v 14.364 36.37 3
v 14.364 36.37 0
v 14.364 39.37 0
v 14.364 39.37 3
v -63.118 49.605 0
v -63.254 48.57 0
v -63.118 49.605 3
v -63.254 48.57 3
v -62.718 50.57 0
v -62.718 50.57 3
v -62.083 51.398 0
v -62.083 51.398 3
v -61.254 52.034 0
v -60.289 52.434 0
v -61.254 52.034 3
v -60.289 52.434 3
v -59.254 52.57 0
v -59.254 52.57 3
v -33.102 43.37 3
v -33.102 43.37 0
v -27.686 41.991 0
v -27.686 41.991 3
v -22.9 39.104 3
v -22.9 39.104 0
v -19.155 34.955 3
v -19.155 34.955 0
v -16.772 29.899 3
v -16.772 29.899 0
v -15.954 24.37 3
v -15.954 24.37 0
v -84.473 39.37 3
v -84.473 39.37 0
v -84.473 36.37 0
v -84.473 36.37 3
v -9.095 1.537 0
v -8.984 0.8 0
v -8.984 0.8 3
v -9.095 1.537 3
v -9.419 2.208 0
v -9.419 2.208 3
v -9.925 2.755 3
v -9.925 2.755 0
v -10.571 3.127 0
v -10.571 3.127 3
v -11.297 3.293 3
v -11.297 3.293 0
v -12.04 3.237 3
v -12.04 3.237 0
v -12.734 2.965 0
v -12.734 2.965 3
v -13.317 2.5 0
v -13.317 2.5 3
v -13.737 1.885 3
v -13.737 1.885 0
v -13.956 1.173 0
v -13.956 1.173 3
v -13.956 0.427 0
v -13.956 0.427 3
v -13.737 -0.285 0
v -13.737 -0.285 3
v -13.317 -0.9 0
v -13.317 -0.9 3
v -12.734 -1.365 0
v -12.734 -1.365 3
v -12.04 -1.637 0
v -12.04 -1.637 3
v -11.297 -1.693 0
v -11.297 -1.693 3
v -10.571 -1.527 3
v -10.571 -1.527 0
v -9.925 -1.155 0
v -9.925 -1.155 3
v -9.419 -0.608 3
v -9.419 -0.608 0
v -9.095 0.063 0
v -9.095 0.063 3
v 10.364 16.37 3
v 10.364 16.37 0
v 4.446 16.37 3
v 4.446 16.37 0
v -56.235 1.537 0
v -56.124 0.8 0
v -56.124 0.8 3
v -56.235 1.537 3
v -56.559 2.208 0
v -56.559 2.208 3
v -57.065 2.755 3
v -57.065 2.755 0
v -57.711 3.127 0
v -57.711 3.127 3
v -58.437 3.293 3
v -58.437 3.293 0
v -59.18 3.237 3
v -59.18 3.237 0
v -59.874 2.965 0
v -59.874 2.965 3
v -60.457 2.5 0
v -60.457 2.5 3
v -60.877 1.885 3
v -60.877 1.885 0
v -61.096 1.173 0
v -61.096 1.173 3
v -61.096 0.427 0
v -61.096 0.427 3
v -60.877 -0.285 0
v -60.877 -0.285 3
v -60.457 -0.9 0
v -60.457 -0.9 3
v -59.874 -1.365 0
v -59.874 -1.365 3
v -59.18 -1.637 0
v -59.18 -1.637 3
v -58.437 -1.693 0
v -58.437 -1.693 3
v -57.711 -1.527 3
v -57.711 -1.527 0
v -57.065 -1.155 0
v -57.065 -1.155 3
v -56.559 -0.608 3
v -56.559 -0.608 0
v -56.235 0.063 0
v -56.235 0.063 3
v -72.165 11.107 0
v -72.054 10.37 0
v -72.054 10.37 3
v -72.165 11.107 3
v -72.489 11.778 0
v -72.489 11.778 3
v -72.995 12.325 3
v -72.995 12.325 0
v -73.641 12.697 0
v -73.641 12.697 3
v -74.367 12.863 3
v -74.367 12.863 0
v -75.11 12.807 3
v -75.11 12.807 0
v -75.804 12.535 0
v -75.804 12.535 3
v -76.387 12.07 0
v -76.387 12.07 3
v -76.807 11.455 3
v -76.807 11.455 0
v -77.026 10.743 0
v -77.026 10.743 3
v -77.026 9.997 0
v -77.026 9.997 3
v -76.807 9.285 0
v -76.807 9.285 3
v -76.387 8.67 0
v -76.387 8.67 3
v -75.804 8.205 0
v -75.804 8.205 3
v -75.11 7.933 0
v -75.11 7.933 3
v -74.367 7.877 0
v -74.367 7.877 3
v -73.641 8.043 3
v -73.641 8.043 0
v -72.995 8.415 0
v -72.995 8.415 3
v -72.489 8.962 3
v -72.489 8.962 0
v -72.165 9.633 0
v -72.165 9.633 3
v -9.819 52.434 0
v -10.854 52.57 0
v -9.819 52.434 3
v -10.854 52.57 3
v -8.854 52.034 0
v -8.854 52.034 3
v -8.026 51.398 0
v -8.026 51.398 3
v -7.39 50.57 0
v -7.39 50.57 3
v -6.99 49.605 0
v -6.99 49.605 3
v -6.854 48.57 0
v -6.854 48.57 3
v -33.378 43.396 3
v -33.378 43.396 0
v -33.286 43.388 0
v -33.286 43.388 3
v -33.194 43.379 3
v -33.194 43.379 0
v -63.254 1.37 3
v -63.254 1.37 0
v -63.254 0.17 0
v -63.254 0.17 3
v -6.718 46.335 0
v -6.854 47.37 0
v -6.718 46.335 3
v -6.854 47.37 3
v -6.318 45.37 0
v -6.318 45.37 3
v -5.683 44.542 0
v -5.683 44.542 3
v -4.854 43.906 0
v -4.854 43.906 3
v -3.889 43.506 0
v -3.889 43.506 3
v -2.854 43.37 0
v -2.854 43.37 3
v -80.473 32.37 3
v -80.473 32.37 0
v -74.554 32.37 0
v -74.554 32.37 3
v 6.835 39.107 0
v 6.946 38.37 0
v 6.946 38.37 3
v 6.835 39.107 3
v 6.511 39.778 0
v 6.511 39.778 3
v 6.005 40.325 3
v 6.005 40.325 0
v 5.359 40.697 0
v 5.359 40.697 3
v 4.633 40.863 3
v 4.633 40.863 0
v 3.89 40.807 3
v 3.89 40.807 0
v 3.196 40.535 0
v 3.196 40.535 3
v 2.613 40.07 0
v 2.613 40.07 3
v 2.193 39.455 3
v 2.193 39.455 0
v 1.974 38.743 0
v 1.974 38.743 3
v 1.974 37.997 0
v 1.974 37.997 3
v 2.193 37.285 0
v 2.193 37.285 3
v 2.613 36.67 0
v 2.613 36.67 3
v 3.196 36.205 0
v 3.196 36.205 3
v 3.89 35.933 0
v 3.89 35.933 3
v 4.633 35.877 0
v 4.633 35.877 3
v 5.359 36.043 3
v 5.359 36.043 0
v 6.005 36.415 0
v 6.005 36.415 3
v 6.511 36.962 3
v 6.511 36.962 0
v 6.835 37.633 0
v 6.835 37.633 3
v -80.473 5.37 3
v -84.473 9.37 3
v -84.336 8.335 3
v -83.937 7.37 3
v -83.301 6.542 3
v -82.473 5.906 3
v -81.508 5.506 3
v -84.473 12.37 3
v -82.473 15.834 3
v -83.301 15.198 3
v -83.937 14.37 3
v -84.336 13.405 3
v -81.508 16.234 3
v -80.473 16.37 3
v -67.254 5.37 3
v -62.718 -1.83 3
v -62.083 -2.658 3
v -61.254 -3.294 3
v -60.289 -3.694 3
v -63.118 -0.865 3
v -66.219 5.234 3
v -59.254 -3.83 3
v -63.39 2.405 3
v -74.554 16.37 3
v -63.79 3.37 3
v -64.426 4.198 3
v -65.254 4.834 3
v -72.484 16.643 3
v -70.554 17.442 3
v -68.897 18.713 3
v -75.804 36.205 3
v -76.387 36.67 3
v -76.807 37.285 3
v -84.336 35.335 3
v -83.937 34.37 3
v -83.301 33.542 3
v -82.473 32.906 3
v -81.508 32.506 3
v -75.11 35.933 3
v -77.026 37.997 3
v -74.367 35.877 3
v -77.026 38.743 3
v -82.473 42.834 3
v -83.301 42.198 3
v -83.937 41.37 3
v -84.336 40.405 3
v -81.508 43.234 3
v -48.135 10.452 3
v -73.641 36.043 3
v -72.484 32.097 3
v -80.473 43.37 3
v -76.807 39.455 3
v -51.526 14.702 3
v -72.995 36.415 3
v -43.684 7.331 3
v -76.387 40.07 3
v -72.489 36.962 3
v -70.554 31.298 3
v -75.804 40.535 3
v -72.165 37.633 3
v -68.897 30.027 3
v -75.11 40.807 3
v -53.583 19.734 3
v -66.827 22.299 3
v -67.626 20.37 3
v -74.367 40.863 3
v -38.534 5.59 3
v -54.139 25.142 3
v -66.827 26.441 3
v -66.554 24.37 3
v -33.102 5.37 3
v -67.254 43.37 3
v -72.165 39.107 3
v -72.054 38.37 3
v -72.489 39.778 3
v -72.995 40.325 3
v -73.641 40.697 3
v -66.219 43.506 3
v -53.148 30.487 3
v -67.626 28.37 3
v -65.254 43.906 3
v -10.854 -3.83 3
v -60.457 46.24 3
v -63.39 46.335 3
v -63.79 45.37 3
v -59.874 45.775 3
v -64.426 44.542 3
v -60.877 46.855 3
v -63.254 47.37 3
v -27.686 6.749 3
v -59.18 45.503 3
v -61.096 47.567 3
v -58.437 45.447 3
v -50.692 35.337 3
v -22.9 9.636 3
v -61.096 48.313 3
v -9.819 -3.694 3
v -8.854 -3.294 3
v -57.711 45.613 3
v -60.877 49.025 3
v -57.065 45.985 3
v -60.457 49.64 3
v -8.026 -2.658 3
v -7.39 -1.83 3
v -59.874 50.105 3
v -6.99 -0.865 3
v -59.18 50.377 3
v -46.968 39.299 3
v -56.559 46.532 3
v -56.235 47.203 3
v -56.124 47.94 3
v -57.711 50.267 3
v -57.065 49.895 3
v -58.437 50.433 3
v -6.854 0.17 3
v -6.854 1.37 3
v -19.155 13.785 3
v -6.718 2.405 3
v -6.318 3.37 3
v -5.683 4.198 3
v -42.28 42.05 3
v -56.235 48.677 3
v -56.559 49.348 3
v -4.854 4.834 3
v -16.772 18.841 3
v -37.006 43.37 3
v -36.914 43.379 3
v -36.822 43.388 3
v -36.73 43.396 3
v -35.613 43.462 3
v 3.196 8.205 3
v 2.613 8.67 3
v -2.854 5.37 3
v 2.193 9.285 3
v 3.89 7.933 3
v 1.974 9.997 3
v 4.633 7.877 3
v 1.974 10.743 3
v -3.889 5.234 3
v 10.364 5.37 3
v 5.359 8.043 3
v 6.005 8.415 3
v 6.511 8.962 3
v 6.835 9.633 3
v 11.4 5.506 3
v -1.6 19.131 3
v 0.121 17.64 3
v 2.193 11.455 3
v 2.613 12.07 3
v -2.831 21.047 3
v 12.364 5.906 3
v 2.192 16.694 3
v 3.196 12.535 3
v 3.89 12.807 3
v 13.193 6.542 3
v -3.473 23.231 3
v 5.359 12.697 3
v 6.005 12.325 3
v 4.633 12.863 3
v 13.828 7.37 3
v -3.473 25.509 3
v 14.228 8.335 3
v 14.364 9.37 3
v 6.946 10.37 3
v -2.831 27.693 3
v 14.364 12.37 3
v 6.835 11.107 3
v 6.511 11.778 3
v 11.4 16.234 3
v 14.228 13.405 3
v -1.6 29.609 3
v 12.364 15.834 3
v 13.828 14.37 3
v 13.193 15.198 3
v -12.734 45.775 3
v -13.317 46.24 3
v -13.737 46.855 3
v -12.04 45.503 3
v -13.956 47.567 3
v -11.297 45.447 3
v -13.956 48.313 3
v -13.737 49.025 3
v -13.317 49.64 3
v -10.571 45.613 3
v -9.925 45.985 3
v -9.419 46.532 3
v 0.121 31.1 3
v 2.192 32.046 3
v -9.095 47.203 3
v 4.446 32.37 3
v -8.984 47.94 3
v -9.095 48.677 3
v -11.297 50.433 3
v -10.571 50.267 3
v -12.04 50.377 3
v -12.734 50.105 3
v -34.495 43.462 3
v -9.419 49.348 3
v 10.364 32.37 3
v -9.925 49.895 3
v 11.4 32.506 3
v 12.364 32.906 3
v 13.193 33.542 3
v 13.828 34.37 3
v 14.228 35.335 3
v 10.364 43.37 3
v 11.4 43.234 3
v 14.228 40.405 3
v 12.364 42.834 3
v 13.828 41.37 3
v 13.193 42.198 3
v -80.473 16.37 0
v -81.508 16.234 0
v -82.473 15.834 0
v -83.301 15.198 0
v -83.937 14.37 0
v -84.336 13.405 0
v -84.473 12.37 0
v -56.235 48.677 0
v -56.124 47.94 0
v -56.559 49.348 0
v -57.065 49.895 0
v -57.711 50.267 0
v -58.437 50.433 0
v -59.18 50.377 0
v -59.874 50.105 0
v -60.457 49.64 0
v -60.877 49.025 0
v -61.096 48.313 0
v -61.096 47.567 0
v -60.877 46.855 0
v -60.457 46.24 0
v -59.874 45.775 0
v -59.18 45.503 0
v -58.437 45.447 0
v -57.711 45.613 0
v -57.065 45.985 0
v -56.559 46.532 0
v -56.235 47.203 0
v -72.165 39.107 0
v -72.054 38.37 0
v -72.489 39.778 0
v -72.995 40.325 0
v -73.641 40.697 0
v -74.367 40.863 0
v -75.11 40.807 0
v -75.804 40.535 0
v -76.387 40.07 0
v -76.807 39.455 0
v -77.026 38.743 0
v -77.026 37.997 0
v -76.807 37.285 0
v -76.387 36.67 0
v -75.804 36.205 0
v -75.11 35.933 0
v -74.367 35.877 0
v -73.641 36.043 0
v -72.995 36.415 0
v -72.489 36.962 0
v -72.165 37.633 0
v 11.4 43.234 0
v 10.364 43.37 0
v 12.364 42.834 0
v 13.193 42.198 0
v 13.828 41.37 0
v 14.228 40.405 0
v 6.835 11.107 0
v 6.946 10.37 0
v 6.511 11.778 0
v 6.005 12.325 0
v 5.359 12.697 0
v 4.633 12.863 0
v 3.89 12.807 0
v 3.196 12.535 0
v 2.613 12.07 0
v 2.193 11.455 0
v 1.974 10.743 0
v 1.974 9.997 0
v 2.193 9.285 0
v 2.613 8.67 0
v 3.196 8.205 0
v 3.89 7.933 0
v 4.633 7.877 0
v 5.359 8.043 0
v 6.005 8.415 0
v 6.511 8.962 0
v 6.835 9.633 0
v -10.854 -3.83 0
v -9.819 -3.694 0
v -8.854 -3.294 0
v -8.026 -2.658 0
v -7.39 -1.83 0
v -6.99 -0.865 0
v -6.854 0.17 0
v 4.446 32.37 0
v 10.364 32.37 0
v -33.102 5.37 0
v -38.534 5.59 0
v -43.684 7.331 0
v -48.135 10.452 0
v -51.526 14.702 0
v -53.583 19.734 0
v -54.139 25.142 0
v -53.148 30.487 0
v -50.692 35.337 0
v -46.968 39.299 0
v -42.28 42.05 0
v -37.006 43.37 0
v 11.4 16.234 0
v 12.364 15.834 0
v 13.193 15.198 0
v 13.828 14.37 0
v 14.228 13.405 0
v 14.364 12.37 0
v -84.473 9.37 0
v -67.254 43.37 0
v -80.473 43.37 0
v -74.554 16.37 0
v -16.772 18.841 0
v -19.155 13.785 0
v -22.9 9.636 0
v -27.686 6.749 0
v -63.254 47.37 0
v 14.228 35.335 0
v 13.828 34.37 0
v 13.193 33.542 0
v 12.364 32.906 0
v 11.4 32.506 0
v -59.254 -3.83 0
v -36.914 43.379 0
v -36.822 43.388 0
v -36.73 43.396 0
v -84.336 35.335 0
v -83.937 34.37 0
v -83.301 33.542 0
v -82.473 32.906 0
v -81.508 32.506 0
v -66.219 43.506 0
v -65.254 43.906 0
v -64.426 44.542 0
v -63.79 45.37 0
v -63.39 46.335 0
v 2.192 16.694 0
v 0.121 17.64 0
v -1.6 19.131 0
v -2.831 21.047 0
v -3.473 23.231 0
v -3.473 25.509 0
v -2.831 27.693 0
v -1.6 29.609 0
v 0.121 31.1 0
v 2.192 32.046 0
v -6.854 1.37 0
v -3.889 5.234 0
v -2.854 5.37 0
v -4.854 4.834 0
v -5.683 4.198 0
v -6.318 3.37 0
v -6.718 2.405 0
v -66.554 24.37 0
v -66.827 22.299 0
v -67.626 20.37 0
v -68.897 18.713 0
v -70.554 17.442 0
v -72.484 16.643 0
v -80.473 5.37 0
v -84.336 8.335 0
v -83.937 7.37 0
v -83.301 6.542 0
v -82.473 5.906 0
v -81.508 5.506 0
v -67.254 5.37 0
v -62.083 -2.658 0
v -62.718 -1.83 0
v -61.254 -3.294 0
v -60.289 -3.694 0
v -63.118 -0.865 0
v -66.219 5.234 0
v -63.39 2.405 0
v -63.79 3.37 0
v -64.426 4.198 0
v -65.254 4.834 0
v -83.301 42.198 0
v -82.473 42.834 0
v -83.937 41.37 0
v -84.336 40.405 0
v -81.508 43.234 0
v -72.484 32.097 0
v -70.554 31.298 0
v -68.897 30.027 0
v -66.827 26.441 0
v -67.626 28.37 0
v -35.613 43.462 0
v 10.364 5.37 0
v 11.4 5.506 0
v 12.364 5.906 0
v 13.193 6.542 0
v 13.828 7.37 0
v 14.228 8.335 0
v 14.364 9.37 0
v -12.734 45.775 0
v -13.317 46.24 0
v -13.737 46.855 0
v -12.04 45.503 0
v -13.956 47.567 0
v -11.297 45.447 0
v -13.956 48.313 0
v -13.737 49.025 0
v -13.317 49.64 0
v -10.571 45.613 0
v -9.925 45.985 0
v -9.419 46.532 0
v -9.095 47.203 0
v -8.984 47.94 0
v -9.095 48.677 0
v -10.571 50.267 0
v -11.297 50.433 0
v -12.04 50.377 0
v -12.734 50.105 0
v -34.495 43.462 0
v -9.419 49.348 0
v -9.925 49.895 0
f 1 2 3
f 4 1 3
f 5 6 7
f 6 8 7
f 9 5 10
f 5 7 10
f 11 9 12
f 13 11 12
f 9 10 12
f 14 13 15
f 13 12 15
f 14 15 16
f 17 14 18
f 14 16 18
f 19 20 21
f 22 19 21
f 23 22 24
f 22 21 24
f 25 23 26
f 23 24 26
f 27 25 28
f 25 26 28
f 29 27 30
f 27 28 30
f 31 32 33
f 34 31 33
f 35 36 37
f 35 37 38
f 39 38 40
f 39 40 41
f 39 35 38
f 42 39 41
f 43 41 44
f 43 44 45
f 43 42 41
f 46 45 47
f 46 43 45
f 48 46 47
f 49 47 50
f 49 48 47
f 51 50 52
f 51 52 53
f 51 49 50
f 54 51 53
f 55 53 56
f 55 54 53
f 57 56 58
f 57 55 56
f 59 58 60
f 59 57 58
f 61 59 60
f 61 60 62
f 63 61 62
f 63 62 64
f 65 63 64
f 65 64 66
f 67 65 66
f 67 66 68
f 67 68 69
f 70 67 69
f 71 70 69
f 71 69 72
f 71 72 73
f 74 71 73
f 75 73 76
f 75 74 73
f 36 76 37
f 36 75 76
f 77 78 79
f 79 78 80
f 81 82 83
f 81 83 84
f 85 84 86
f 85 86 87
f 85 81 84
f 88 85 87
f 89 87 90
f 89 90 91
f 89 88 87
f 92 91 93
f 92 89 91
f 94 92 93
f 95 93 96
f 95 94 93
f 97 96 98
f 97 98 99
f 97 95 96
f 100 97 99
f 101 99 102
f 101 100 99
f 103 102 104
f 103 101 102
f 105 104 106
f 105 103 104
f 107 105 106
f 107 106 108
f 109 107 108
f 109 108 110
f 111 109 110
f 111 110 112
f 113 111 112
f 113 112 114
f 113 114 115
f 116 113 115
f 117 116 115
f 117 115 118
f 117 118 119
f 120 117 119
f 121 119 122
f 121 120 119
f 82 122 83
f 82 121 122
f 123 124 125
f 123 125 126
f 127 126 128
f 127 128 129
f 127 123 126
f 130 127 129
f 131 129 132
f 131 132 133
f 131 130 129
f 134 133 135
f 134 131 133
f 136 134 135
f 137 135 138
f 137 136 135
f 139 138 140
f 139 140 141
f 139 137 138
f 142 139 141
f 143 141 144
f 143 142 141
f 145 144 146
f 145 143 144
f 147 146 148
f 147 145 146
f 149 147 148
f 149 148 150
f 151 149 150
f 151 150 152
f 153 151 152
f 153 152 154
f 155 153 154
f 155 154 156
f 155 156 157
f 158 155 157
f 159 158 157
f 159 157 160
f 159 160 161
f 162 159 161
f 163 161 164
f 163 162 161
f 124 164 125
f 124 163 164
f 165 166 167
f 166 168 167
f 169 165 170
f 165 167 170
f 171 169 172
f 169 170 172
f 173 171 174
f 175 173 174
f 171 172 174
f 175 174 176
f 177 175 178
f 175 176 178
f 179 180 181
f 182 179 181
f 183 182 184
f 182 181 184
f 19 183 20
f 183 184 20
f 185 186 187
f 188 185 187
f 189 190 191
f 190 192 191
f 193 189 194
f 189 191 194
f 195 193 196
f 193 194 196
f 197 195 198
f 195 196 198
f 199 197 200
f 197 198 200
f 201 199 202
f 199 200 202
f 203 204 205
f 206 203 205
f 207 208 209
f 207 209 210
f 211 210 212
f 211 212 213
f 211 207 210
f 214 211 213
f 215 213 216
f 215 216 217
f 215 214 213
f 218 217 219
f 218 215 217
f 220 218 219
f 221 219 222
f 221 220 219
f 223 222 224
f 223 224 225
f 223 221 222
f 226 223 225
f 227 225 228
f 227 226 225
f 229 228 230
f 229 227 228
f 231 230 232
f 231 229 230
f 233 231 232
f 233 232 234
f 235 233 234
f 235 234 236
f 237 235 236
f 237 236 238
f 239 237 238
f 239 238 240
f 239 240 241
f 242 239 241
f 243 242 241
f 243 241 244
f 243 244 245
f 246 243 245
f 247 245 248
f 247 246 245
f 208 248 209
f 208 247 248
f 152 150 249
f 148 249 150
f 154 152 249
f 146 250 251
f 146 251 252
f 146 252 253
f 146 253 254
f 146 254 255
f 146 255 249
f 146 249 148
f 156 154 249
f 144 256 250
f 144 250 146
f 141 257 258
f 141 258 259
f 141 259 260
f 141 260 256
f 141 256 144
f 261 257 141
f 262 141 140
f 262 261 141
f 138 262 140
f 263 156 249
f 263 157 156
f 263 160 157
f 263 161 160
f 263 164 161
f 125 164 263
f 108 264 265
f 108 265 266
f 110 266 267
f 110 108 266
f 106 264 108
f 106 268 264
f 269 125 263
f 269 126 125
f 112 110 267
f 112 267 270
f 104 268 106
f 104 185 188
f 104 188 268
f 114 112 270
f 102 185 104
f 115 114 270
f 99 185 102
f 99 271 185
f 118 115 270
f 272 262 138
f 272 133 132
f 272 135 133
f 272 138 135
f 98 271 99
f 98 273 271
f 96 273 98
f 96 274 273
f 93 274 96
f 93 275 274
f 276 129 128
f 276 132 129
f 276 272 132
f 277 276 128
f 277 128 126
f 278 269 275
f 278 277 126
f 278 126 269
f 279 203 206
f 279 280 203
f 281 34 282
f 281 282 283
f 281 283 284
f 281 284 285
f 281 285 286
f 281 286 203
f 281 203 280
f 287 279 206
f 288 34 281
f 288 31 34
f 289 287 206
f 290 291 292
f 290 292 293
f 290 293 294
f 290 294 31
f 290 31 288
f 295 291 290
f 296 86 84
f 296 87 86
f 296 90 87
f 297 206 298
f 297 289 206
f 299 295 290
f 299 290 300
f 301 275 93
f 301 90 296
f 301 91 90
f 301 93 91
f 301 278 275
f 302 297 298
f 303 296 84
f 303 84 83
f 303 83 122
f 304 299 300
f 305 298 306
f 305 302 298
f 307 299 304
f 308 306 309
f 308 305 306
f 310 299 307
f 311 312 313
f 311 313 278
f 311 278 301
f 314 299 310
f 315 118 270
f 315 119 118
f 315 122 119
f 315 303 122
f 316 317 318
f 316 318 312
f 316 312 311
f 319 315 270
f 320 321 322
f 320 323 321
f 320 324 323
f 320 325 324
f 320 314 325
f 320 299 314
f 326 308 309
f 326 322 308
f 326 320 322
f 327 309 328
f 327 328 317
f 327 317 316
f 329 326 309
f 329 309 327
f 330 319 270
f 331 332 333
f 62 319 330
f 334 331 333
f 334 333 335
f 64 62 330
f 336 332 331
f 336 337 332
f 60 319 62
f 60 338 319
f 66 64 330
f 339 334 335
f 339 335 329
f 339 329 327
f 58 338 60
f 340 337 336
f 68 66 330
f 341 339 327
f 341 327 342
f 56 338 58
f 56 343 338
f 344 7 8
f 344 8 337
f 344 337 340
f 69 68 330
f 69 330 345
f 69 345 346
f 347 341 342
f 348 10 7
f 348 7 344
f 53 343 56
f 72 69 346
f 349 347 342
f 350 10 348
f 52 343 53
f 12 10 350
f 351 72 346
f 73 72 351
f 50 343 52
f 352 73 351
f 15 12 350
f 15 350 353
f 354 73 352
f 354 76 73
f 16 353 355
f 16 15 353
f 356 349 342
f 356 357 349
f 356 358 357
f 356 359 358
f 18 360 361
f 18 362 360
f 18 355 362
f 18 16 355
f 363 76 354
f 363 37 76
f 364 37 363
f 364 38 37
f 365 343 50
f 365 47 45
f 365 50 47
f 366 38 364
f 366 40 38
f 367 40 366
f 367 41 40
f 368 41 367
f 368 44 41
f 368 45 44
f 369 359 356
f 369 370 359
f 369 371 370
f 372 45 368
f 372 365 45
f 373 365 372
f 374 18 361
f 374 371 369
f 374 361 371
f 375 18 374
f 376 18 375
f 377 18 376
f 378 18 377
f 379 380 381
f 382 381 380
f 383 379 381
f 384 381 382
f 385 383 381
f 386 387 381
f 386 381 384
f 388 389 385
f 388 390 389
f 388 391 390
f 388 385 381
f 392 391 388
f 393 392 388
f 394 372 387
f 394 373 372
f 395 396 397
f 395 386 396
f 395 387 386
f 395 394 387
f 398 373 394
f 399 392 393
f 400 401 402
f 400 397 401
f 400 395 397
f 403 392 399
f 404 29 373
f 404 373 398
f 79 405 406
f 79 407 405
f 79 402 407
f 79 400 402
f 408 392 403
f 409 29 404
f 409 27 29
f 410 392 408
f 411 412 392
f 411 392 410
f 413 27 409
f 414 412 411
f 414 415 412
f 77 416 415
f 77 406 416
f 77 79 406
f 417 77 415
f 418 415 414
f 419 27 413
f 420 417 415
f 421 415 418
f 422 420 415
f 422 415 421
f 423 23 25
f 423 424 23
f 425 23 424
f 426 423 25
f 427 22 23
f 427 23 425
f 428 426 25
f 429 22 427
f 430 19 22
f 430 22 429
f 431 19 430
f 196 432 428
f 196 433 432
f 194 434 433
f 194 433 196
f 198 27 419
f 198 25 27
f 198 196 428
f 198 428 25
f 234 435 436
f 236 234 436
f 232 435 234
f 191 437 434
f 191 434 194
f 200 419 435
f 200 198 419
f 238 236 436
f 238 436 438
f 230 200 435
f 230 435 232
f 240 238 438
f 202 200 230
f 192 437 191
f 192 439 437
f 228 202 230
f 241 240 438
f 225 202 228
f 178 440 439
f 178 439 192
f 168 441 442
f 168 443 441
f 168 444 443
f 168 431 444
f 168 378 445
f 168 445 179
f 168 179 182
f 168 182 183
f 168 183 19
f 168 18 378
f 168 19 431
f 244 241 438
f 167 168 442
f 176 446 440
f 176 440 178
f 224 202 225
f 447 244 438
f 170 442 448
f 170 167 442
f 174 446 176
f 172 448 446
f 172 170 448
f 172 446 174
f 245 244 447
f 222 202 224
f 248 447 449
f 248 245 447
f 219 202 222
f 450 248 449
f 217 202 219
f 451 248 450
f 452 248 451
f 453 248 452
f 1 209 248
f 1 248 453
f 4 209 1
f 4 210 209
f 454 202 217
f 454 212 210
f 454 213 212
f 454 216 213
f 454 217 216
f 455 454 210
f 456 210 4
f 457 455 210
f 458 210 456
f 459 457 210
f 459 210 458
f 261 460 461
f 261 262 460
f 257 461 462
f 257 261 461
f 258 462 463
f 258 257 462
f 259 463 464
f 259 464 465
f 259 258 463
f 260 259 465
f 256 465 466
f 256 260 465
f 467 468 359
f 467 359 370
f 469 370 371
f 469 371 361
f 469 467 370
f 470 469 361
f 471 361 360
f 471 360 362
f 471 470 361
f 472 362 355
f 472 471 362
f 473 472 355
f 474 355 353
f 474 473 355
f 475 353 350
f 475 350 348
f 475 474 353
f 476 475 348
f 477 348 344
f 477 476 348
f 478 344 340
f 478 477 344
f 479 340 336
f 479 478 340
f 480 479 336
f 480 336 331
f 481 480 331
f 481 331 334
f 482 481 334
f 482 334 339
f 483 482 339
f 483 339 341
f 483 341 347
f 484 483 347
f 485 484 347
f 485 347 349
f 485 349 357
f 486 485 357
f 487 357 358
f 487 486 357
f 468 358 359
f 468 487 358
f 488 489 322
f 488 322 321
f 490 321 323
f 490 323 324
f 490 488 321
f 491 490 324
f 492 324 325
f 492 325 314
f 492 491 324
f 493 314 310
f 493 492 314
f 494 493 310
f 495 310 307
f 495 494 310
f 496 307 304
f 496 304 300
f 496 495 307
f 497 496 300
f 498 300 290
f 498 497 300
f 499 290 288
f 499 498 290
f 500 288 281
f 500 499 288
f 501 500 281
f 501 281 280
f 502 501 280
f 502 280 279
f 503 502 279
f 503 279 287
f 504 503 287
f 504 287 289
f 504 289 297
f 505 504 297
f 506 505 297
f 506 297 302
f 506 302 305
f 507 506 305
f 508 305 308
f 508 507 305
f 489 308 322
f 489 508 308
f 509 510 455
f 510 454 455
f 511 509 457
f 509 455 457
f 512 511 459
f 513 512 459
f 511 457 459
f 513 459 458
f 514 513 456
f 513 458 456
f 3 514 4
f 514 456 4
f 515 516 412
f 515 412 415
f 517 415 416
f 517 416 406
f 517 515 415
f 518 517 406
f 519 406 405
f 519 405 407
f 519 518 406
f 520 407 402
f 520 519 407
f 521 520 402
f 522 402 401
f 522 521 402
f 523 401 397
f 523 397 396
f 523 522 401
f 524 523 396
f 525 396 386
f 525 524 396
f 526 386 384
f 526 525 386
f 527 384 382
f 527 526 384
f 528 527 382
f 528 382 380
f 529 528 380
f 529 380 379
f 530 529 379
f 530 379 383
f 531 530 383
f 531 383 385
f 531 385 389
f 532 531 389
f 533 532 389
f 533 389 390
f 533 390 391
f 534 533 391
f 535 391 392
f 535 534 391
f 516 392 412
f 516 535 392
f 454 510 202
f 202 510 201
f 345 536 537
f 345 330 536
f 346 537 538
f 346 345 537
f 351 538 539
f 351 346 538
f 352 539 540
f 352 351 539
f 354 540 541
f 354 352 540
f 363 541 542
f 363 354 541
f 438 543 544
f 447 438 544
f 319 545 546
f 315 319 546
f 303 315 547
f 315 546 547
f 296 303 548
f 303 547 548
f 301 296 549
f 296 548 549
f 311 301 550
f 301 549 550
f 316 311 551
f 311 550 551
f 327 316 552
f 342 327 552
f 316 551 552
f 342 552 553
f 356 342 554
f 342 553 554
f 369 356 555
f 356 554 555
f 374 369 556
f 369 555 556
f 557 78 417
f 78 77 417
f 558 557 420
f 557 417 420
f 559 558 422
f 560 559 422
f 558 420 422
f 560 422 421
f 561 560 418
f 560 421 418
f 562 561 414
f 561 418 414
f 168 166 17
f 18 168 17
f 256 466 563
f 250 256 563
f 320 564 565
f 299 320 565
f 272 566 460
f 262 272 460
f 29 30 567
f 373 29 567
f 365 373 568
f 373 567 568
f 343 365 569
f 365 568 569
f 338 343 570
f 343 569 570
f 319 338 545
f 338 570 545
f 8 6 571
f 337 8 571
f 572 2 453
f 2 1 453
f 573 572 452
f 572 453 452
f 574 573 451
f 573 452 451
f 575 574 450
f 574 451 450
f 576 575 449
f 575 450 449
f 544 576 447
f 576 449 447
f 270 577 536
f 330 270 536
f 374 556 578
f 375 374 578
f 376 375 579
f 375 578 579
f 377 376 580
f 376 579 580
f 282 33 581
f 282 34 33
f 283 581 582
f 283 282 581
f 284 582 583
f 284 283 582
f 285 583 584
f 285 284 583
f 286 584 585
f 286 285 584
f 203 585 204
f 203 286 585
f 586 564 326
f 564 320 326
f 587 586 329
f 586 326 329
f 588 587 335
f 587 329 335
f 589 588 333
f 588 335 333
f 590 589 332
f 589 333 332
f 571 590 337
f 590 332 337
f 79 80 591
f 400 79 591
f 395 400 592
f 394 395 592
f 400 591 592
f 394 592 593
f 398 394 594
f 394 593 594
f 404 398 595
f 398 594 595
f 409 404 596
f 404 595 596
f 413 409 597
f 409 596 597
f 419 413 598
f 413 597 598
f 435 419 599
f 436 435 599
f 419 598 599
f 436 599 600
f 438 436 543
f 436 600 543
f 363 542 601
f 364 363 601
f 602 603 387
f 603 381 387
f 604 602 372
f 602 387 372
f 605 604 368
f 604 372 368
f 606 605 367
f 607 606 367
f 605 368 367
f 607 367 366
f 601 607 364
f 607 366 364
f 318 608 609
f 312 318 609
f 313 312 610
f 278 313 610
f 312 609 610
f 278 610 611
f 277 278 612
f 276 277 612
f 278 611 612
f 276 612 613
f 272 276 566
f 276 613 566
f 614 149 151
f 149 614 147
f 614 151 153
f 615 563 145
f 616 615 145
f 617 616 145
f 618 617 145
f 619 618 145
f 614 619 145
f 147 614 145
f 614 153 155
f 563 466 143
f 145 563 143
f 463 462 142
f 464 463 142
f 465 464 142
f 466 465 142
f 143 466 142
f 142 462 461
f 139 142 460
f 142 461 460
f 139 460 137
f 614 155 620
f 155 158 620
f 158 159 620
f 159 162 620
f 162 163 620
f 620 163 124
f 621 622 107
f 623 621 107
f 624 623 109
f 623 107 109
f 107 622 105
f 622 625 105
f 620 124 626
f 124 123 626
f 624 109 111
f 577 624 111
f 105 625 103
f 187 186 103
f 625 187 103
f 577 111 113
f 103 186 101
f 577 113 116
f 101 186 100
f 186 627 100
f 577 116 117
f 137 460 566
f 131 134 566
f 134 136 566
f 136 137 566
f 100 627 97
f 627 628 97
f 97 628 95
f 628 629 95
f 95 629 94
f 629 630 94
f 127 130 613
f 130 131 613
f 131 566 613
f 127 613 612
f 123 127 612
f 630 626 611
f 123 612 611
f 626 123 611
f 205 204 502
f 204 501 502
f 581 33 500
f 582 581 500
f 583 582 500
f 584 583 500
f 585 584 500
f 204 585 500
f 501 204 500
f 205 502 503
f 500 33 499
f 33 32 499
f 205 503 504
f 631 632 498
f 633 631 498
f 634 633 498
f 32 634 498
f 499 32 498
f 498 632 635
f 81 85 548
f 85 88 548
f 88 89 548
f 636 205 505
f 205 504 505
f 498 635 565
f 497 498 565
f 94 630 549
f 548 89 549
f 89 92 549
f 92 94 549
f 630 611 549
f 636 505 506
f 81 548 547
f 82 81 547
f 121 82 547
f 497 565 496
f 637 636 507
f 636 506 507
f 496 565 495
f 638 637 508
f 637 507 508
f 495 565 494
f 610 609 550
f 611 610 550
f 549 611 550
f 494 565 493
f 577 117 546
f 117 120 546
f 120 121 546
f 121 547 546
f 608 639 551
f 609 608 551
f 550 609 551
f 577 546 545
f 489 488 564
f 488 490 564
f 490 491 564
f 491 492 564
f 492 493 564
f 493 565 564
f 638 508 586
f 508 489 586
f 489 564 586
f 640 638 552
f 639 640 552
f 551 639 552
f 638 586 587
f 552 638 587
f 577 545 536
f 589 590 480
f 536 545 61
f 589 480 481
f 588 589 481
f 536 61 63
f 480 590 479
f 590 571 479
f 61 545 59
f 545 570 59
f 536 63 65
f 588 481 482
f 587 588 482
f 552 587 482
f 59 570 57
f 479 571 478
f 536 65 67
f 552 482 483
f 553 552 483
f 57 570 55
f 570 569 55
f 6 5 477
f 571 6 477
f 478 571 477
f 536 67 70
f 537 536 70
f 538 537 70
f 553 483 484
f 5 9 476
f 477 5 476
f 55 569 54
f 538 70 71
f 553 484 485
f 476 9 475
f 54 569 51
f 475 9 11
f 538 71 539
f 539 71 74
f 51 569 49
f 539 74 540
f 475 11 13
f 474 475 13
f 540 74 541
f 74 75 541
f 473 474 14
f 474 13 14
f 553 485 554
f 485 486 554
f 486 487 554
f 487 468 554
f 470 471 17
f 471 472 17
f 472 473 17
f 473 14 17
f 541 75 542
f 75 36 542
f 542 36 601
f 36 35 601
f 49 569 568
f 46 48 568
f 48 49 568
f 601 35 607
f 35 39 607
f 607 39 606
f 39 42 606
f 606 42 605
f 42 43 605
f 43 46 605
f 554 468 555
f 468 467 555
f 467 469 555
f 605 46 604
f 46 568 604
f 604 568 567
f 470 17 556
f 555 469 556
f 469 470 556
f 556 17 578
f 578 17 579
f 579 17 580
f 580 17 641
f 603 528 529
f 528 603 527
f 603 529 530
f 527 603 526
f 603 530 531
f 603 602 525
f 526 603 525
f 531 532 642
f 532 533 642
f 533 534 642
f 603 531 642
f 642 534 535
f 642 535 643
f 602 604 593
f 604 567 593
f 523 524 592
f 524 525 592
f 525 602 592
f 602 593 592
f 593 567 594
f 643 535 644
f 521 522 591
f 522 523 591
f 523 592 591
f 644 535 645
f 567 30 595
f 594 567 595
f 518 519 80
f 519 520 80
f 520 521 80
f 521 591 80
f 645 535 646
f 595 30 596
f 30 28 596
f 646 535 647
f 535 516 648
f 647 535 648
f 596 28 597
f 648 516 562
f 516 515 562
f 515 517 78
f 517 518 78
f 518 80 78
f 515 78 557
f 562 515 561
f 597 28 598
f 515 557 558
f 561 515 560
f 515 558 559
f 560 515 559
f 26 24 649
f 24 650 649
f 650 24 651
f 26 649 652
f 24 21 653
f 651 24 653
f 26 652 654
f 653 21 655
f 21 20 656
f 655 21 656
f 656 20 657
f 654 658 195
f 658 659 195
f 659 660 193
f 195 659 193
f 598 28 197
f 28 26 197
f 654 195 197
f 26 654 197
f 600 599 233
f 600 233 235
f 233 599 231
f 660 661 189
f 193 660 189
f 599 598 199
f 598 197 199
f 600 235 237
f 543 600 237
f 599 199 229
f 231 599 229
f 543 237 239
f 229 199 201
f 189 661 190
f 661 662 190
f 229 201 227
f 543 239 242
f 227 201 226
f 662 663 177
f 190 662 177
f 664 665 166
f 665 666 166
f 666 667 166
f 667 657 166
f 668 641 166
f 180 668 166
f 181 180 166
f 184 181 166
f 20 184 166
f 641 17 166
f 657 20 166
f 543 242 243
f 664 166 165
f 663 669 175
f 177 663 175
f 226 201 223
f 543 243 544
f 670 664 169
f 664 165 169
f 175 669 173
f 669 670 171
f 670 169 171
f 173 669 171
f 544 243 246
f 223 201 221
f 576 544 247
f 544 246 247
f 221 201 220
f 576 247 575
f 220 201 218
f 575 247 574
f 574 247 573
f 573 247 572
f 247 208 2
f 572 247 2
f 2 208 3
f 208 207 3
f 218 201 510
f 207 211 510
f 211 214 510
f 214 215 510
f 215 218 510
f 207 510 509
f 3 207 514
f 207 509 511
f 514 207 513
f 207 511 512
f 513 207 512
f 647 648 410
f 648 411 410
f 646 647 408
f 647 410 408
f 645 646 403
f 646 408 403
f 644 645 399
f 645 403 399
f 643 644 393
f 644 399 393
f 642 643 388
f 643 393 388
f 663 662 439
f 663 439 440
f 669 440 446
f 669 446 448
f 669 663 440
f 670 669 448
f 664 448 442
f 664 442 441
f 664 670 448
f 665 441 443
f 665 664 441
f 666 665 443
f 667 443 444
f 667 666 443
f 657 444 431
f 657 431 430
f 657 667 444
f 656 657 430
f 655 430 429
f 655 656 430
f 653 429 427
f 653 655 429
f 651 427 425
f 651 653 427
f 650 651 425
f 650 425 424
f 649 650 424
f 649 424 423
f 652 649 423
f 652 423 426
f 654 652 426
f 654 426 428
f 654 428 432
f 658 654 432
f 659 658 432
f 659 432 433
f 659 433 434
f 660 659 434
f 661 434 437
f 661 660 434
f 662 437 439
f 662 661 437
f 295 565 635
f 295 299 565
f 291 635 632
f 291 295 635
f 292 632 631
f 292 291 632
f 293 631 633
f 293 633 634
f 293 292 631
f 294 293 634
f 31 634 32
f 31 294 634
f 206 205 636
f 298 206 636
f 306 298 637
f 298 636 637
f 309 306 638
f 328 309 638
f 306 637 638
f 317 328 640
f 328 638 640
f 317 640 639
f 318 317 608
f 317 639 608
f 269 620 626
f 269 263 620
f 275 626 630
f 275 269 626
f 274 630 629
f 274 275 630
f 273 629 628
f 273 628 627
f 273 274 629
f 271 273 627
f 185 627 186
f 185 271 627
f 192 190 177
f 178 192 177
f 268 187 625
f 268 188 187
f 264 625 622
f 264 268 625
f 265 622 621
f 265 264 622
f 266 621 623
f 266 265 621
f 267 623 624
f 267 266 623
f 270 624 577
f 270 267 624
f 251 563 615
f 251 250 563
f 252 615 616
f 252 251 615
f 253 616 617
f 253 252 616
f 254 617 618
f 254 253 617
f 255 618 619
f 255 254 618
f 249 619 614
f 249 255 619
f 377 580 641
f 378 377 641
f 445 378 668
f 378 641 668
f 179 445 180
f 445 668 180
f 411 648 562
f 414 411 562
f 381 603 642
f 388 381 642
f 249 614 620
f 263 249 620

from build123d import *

# Parameters (mm, degrees)
F0_R     = 2.5
F1_DEPTH = 3
F2_R     = 4


with BuildPart() as f1:
    # F0 (on Top) → F1 (new body)
    with BuildSketch(Plane.XY):
        with BuildLine():
            Line((-37.006066629, 43.3700063947), (-63.2541444994, 43.3700063947))
            Line((-63.2541444994, 43.3700063947), (-63.2541444994, 5.3700063947))
            Line((-63.2541444994, 5.3700063947), (-37.006066629, 5.3700063947))
            ThreePointArc((-37.006066629, 5.3700063947), (-54.1541444994, 24.3700063947), (-37.006066629, 43.3700063947))
        make_face()
        with BuildLine():
            Line((-6.8541444994, 43.3700063947), (-33.1022223698, 43.3700063947))
            ThreePointArc((-33.1022223698, 43.3700063947), (-20.8750804845, 37.1670429135), (-15.9541444994, 24.3700063947))
            ThreePointArc((-15.9541444994, 24.3700063947), (-20.8750804845, 11.572969876), (-33.1022223698, 5.3700063947))
            Line((-33.1022223698, 5.3700063947), (-6.8541444994, 5.3700063947))
            Line((-6.8541444994, 5.3700063947), (-6.8541444994, 43.3700063947))
        make_face()
        with BuildLine():
            ThreePointArc((-74.5541444994, 32.3700063947), (-68.8972902499, 30.0268606442), (-66.5541444994, 24.3700063947))
            ThreePointArc((-66.5541444994, 24.3700063947), (-68.8972902499, 18.7131521453), (-74.5541444994, 16.3700063947))
            Line((-74.5541444994, 16.3700063947), (-84.4726338983, 16.3700063947))
            Line((-84.4726338983, 16.3700063947), (-84.4726338983, 5.3700063947))
            Line((-84.4726338983, 5.3700063947), (-63.2541444994, 5.3700063947))
            Line((-63.2541444994, 5.3700063947), (-63.2541444994, 43.3700063947))
            Line((-63.2541444994, 43.3700063947), (-84.4726338983, 43.3700063947))
            Line((-84.4726338983, 43.3700063947), (-84.4726338983, 32.3700063947))
            Line((-84.4726338983, 32.3700063947), (-74.5541444994, 32.3700063947))
        make_face()
        with Locations((-74.5541444994, 10.3700063947)):
            Circle(F0_R, mode=Mode.SUBTRACT)
        with Locations((-74.5541444994, 38.3700063947)):
            Circle(F0_R, mode=Mode.SUBTRACT)
        with BuildLine():
            Line((14.3643448995, 43.3700063947), (-6.8541444994, 43.3700063947))
            Line((-6.8541444994, 43.3700063947), (-6.8541444994, 5.3700063947))
            Line((-6.8541444994, 5.3700063947), (14.3643448995, 5.3700063947))
            Line((14.3643448995, 5.3700063947), (14.3643448995, 16.3700063947))
            Line((14.3643448995, 16.3700063947), (4.4458555006, 16.3700063947))
            ThreePointArc((4.4458555006, 16.3700063947), (-3.5541444994, 24.3700063947), (4.4458555006, 32.3700063947))
            Line((4.4458555006, 32.3700063947), (14.3643448995, 32.3700063947))
            Line((14.3643448995, 32.3700063947), (14.3643448995, 43.3700063947))
        make_face()
        with Locations((4.4458555006, 10.3700063947)):
            Circle(F0_R, mode=Mode.SUBTRACT)
        with Locations((4.4458555006, 38.3700063947)):
            Circle(F0_R, mode=Mode.SUBTRACT)
        with BuildLine():
            Line((-37.006066629, 5.3700063947), (-63.2541444994, 5.3700063947))
            Line((-63.2541444994, 5.3700063947), (-63.2541444994, -3.8299936053))
            Line((-63.2541444994, -3.8299936053), (-6.8541444994, -3.8299936053))
            Line((-6.8541444994, -3.8299936053), (-6.8541444994, 5.3700063947))
            Line((-6.8541444994, 5.3700063947), (-33.1022223698, 5.3700063947))
            ThreePointArc((-33.1022223698, 5.3700063947), (-35.0541444994, 5.2700063947), (-37.006066629, 5.3700063947))
        make_face()
        with Locations((-58.6241444994, 0.8000063947)):
            Circle(F0_R, mode=Mode.SUBTRACT)
        with Locations((-11.4841444994, 0.8000063947)):
            Circle(F0_R, mode=Mode.SUBTRACT)
        with BuildLine():
            Line((-63.2541444994, 52.5700063947), (-63.2541444994, 43.3700063947))
            Line((-63.2541444994, 43.3700063947), (-37.006066629, 43.3700063947))
            ThreePointArc((-37.006066629, 43.3700063947), (-36.8681827001, 43.3836663635), (-36.7302033051, 43.3963257151))
            ThreePointArc((-36.7302033051, 43.3963257151), (-35.0541444994, 43.4700063947), (-33.3780856936, 43.3963257151))
            ThreePointArc((-33.3780856936, 43.3963257151), (-33.2401062987, 43.3836663635), (-33.1022223698, 43.3700063947))
            Line((-33.1022223698, 43.3700063947), (-6.8541444994, 43.3700063947))
            Line((-6.8541444994, 43.3700063947), (-6.8541444994, 52.5700063947))
            Line((-6.8541444994, 52.5700063947), (-63.2541444994, 52.5700063947))
        make_face()
        with Locations((-58.6241444994, 47.9400063947)):
            Circle(F0_R, mode=Mode.SUBTRACT)
        with Locations((-11.4841444994, 47.9400063947)):
            Circle(F0_R, mode=Mode.SUBTRACT)
    extrude(amount=F1_DEPTH)

    # F2
    f2_edges = [f1.edges().sort_by_distance(p)[0] for p in [
        (-6.854144, 52.570006, 1.5),
        (14.364345, 43.370006, 1.5),
        (14.364345, 5.370006, 1.5),
        (-6.854144, -3.829994, 1.5),
        (-63.254144, 52.570006, 1.5),
        (-84.472634, 43.370006, 1.5),
        (-84.472634, 16.370006, 1.5),
        (-84.472634, 32.370006, 1.5),
        (-84.472634, 5.370006, 1.5),
        (-63.254144, -3.829994, 1.5),
        (14.364345, 32.370006, 1.5),
        (14.364345, 16.370006, 1.5),
        (-6.854144, 43.370006, 1.5),
        (-6.854144, 5.370006, 1.5),
        (-63.254144, 5.370006, 1.5),
        (-63.254144, 43.370006, 1.5),
    ]]
    fillet(f2_edges, radius=F2_R)


solid = f1.part
